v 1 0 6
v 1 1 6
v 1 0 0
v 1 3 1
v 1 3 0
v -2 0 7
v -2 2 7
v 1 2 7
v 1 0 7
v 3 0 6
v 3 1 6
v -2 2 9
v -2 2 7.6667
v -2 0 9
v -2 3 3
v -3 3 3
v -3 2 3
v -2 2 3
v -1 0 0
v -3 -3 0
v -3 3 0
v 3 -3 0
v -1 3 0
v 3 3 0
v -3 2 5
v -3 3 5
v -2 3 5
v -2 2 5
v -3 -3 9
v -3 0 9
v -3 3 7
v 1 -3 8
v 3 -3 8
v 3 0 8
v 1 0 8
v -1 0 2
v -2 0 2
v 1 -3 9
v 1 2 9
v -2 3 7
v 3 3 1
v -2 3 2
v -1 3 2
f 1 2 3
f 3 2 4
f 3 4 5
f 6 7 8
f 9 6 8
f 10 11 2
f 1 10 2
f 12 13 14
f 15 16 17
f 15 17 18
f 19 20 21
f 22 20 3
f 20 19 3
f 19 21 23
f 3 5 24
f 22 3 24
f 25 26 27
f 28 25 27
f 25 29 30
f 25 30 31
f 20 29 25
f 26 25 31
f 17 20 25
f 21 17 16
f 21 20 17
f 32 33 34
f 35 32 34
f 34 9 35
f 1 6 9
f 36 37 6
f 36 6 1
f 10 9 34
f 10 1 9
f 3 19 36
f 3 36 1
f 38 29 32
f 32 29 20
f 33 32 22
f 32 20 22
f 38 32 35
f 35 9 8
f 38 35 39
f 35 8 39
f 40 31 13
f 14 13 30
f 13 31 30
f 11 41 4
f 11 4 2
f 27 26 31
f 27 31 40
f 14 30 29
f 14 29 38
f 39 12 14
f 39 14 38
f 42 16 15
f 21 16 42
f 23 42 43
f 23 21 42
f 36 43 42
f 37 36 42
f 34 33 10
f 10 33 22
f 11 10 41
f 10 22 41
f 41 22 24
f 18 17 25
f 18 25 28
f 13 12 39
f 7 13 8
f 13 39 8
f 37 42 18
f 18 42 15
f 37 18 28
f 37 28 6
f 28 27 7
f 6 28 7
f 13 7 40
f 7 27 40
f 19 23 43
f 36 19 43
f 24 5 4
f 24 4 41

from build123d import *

# Parameters (mm, degrees)
SKETCH1_W           = 6
SKETCH1_H           = 6
BOSS_EXTRUDE1_DEPTH = 9
CUT_EXTRUDE1_DEPTH  = 3
SKETCH3_W           = 1
SKETCH3_H           = 2
CUT_EXTRUDE2_DEPTH  = 1
CUT_EXTRUDE3_DEPTH  = 1
SKETCH5_W           = 2
SKETCH5_H           = 1
CUT_EXTRUDE4_DEPTH  = 3
SKETCH6_W           = 1
SKETCH6_H           = 3
CUT_EXTRUDE5_DEPTH  = 2
CUT_EXTRUDE6_DEPTH  = 2


with BuildPart() as part:
    # Sketch1 → Boss-Extrude1 (new body)
    with BuildSketch(Plane.XY):
        Rectangle(SKETCH1_W, SKETCH1_H)
    extrude(amount=BOSS_EXTRUDE1_DEPTH)

    # Sketch2 → Cut-Extrude1 (cut)
    with BuildSketch(Plane(origin=(0, 3, 0), x_dir=(1, 0, 0), z_dir=(0, 1, 0))):
        Polygon((1, 0), (-1, 0), (-1, -2), (-2, -2), (-2, -7), (1, -7), (1, -9), (3, -9), (3, -6), (1, -6), align=None)
    extrude(amount=-CUT_EXTRUDE1_DEPTH, mode=Mode.SUBTRACT)

    # Sketch3 → Cut-Extrude2 (cut)
    with BuildSketch(Plane(origin=(0, 3, 0), x_dir=(1, 0, 0), z_dir=(0, 1, 0))):
        with Locations((-2.5, -4)):
            Rectangle(SKETCH3_W, SKETCH3_H)
    extrude(amount=-CUT_EXTRUDE2_DEPTH, mode=Mode.SUBTRACT)

    # Sketch4 → Cut-Extrude3 (cut)
    with BuildSketch(Plane.ZY.offset(3)):
        Polygon((7, 3), (9, 0), (9, 3), align=None)
    extrude(amount=-CUT_EXTRUDE3_DEPTH, mode=Mode.SUBTRACT)

    # Sketch5 → Cut-Extrude4 (cut)
    with BuildSketch(Plane(origin=(1, 0, 0), x_dir=(0, 0, -1), z_dir=(1, 0, 0))):
        with Locations((-8, 2.5)):
            Rectangle(SKETCH5_W, SKETCH5_H)
    extrude(amount=-CUT_EXTRUDE4_DEPTH, mode=Mode.SUBTRACT)

    # Sketch6 → Cut-Extrude5 (cut)
    with BuildSketch(Plane(origin=(3, 0, 0), x_dir=(0, 0, -1), z_dir=(1, 0, 0))):
        with Locations((-8.5, -1.5)):
            Rectangle(SKETCH6_W, SKETCH6_H)
    extrude(amount=-CUT_EXTRUDE5_DEPTH, mode=Mode.SUBTRACT)

    # Sketch7 → Cut-Extrude6 (cut)
    with BuildSketch(Plane(origin=(3, 0, 0), x_dir=(0, 0, -1), z_dir=(1, 0, 0))):
        Polygon((-1, 3), (-6, 1), (-6, 3), align=None)
    extrude(amount=-CUT_EXTRUDE6_DEPTH, mode=Mode.SUBTRACT)


solid = part.part
